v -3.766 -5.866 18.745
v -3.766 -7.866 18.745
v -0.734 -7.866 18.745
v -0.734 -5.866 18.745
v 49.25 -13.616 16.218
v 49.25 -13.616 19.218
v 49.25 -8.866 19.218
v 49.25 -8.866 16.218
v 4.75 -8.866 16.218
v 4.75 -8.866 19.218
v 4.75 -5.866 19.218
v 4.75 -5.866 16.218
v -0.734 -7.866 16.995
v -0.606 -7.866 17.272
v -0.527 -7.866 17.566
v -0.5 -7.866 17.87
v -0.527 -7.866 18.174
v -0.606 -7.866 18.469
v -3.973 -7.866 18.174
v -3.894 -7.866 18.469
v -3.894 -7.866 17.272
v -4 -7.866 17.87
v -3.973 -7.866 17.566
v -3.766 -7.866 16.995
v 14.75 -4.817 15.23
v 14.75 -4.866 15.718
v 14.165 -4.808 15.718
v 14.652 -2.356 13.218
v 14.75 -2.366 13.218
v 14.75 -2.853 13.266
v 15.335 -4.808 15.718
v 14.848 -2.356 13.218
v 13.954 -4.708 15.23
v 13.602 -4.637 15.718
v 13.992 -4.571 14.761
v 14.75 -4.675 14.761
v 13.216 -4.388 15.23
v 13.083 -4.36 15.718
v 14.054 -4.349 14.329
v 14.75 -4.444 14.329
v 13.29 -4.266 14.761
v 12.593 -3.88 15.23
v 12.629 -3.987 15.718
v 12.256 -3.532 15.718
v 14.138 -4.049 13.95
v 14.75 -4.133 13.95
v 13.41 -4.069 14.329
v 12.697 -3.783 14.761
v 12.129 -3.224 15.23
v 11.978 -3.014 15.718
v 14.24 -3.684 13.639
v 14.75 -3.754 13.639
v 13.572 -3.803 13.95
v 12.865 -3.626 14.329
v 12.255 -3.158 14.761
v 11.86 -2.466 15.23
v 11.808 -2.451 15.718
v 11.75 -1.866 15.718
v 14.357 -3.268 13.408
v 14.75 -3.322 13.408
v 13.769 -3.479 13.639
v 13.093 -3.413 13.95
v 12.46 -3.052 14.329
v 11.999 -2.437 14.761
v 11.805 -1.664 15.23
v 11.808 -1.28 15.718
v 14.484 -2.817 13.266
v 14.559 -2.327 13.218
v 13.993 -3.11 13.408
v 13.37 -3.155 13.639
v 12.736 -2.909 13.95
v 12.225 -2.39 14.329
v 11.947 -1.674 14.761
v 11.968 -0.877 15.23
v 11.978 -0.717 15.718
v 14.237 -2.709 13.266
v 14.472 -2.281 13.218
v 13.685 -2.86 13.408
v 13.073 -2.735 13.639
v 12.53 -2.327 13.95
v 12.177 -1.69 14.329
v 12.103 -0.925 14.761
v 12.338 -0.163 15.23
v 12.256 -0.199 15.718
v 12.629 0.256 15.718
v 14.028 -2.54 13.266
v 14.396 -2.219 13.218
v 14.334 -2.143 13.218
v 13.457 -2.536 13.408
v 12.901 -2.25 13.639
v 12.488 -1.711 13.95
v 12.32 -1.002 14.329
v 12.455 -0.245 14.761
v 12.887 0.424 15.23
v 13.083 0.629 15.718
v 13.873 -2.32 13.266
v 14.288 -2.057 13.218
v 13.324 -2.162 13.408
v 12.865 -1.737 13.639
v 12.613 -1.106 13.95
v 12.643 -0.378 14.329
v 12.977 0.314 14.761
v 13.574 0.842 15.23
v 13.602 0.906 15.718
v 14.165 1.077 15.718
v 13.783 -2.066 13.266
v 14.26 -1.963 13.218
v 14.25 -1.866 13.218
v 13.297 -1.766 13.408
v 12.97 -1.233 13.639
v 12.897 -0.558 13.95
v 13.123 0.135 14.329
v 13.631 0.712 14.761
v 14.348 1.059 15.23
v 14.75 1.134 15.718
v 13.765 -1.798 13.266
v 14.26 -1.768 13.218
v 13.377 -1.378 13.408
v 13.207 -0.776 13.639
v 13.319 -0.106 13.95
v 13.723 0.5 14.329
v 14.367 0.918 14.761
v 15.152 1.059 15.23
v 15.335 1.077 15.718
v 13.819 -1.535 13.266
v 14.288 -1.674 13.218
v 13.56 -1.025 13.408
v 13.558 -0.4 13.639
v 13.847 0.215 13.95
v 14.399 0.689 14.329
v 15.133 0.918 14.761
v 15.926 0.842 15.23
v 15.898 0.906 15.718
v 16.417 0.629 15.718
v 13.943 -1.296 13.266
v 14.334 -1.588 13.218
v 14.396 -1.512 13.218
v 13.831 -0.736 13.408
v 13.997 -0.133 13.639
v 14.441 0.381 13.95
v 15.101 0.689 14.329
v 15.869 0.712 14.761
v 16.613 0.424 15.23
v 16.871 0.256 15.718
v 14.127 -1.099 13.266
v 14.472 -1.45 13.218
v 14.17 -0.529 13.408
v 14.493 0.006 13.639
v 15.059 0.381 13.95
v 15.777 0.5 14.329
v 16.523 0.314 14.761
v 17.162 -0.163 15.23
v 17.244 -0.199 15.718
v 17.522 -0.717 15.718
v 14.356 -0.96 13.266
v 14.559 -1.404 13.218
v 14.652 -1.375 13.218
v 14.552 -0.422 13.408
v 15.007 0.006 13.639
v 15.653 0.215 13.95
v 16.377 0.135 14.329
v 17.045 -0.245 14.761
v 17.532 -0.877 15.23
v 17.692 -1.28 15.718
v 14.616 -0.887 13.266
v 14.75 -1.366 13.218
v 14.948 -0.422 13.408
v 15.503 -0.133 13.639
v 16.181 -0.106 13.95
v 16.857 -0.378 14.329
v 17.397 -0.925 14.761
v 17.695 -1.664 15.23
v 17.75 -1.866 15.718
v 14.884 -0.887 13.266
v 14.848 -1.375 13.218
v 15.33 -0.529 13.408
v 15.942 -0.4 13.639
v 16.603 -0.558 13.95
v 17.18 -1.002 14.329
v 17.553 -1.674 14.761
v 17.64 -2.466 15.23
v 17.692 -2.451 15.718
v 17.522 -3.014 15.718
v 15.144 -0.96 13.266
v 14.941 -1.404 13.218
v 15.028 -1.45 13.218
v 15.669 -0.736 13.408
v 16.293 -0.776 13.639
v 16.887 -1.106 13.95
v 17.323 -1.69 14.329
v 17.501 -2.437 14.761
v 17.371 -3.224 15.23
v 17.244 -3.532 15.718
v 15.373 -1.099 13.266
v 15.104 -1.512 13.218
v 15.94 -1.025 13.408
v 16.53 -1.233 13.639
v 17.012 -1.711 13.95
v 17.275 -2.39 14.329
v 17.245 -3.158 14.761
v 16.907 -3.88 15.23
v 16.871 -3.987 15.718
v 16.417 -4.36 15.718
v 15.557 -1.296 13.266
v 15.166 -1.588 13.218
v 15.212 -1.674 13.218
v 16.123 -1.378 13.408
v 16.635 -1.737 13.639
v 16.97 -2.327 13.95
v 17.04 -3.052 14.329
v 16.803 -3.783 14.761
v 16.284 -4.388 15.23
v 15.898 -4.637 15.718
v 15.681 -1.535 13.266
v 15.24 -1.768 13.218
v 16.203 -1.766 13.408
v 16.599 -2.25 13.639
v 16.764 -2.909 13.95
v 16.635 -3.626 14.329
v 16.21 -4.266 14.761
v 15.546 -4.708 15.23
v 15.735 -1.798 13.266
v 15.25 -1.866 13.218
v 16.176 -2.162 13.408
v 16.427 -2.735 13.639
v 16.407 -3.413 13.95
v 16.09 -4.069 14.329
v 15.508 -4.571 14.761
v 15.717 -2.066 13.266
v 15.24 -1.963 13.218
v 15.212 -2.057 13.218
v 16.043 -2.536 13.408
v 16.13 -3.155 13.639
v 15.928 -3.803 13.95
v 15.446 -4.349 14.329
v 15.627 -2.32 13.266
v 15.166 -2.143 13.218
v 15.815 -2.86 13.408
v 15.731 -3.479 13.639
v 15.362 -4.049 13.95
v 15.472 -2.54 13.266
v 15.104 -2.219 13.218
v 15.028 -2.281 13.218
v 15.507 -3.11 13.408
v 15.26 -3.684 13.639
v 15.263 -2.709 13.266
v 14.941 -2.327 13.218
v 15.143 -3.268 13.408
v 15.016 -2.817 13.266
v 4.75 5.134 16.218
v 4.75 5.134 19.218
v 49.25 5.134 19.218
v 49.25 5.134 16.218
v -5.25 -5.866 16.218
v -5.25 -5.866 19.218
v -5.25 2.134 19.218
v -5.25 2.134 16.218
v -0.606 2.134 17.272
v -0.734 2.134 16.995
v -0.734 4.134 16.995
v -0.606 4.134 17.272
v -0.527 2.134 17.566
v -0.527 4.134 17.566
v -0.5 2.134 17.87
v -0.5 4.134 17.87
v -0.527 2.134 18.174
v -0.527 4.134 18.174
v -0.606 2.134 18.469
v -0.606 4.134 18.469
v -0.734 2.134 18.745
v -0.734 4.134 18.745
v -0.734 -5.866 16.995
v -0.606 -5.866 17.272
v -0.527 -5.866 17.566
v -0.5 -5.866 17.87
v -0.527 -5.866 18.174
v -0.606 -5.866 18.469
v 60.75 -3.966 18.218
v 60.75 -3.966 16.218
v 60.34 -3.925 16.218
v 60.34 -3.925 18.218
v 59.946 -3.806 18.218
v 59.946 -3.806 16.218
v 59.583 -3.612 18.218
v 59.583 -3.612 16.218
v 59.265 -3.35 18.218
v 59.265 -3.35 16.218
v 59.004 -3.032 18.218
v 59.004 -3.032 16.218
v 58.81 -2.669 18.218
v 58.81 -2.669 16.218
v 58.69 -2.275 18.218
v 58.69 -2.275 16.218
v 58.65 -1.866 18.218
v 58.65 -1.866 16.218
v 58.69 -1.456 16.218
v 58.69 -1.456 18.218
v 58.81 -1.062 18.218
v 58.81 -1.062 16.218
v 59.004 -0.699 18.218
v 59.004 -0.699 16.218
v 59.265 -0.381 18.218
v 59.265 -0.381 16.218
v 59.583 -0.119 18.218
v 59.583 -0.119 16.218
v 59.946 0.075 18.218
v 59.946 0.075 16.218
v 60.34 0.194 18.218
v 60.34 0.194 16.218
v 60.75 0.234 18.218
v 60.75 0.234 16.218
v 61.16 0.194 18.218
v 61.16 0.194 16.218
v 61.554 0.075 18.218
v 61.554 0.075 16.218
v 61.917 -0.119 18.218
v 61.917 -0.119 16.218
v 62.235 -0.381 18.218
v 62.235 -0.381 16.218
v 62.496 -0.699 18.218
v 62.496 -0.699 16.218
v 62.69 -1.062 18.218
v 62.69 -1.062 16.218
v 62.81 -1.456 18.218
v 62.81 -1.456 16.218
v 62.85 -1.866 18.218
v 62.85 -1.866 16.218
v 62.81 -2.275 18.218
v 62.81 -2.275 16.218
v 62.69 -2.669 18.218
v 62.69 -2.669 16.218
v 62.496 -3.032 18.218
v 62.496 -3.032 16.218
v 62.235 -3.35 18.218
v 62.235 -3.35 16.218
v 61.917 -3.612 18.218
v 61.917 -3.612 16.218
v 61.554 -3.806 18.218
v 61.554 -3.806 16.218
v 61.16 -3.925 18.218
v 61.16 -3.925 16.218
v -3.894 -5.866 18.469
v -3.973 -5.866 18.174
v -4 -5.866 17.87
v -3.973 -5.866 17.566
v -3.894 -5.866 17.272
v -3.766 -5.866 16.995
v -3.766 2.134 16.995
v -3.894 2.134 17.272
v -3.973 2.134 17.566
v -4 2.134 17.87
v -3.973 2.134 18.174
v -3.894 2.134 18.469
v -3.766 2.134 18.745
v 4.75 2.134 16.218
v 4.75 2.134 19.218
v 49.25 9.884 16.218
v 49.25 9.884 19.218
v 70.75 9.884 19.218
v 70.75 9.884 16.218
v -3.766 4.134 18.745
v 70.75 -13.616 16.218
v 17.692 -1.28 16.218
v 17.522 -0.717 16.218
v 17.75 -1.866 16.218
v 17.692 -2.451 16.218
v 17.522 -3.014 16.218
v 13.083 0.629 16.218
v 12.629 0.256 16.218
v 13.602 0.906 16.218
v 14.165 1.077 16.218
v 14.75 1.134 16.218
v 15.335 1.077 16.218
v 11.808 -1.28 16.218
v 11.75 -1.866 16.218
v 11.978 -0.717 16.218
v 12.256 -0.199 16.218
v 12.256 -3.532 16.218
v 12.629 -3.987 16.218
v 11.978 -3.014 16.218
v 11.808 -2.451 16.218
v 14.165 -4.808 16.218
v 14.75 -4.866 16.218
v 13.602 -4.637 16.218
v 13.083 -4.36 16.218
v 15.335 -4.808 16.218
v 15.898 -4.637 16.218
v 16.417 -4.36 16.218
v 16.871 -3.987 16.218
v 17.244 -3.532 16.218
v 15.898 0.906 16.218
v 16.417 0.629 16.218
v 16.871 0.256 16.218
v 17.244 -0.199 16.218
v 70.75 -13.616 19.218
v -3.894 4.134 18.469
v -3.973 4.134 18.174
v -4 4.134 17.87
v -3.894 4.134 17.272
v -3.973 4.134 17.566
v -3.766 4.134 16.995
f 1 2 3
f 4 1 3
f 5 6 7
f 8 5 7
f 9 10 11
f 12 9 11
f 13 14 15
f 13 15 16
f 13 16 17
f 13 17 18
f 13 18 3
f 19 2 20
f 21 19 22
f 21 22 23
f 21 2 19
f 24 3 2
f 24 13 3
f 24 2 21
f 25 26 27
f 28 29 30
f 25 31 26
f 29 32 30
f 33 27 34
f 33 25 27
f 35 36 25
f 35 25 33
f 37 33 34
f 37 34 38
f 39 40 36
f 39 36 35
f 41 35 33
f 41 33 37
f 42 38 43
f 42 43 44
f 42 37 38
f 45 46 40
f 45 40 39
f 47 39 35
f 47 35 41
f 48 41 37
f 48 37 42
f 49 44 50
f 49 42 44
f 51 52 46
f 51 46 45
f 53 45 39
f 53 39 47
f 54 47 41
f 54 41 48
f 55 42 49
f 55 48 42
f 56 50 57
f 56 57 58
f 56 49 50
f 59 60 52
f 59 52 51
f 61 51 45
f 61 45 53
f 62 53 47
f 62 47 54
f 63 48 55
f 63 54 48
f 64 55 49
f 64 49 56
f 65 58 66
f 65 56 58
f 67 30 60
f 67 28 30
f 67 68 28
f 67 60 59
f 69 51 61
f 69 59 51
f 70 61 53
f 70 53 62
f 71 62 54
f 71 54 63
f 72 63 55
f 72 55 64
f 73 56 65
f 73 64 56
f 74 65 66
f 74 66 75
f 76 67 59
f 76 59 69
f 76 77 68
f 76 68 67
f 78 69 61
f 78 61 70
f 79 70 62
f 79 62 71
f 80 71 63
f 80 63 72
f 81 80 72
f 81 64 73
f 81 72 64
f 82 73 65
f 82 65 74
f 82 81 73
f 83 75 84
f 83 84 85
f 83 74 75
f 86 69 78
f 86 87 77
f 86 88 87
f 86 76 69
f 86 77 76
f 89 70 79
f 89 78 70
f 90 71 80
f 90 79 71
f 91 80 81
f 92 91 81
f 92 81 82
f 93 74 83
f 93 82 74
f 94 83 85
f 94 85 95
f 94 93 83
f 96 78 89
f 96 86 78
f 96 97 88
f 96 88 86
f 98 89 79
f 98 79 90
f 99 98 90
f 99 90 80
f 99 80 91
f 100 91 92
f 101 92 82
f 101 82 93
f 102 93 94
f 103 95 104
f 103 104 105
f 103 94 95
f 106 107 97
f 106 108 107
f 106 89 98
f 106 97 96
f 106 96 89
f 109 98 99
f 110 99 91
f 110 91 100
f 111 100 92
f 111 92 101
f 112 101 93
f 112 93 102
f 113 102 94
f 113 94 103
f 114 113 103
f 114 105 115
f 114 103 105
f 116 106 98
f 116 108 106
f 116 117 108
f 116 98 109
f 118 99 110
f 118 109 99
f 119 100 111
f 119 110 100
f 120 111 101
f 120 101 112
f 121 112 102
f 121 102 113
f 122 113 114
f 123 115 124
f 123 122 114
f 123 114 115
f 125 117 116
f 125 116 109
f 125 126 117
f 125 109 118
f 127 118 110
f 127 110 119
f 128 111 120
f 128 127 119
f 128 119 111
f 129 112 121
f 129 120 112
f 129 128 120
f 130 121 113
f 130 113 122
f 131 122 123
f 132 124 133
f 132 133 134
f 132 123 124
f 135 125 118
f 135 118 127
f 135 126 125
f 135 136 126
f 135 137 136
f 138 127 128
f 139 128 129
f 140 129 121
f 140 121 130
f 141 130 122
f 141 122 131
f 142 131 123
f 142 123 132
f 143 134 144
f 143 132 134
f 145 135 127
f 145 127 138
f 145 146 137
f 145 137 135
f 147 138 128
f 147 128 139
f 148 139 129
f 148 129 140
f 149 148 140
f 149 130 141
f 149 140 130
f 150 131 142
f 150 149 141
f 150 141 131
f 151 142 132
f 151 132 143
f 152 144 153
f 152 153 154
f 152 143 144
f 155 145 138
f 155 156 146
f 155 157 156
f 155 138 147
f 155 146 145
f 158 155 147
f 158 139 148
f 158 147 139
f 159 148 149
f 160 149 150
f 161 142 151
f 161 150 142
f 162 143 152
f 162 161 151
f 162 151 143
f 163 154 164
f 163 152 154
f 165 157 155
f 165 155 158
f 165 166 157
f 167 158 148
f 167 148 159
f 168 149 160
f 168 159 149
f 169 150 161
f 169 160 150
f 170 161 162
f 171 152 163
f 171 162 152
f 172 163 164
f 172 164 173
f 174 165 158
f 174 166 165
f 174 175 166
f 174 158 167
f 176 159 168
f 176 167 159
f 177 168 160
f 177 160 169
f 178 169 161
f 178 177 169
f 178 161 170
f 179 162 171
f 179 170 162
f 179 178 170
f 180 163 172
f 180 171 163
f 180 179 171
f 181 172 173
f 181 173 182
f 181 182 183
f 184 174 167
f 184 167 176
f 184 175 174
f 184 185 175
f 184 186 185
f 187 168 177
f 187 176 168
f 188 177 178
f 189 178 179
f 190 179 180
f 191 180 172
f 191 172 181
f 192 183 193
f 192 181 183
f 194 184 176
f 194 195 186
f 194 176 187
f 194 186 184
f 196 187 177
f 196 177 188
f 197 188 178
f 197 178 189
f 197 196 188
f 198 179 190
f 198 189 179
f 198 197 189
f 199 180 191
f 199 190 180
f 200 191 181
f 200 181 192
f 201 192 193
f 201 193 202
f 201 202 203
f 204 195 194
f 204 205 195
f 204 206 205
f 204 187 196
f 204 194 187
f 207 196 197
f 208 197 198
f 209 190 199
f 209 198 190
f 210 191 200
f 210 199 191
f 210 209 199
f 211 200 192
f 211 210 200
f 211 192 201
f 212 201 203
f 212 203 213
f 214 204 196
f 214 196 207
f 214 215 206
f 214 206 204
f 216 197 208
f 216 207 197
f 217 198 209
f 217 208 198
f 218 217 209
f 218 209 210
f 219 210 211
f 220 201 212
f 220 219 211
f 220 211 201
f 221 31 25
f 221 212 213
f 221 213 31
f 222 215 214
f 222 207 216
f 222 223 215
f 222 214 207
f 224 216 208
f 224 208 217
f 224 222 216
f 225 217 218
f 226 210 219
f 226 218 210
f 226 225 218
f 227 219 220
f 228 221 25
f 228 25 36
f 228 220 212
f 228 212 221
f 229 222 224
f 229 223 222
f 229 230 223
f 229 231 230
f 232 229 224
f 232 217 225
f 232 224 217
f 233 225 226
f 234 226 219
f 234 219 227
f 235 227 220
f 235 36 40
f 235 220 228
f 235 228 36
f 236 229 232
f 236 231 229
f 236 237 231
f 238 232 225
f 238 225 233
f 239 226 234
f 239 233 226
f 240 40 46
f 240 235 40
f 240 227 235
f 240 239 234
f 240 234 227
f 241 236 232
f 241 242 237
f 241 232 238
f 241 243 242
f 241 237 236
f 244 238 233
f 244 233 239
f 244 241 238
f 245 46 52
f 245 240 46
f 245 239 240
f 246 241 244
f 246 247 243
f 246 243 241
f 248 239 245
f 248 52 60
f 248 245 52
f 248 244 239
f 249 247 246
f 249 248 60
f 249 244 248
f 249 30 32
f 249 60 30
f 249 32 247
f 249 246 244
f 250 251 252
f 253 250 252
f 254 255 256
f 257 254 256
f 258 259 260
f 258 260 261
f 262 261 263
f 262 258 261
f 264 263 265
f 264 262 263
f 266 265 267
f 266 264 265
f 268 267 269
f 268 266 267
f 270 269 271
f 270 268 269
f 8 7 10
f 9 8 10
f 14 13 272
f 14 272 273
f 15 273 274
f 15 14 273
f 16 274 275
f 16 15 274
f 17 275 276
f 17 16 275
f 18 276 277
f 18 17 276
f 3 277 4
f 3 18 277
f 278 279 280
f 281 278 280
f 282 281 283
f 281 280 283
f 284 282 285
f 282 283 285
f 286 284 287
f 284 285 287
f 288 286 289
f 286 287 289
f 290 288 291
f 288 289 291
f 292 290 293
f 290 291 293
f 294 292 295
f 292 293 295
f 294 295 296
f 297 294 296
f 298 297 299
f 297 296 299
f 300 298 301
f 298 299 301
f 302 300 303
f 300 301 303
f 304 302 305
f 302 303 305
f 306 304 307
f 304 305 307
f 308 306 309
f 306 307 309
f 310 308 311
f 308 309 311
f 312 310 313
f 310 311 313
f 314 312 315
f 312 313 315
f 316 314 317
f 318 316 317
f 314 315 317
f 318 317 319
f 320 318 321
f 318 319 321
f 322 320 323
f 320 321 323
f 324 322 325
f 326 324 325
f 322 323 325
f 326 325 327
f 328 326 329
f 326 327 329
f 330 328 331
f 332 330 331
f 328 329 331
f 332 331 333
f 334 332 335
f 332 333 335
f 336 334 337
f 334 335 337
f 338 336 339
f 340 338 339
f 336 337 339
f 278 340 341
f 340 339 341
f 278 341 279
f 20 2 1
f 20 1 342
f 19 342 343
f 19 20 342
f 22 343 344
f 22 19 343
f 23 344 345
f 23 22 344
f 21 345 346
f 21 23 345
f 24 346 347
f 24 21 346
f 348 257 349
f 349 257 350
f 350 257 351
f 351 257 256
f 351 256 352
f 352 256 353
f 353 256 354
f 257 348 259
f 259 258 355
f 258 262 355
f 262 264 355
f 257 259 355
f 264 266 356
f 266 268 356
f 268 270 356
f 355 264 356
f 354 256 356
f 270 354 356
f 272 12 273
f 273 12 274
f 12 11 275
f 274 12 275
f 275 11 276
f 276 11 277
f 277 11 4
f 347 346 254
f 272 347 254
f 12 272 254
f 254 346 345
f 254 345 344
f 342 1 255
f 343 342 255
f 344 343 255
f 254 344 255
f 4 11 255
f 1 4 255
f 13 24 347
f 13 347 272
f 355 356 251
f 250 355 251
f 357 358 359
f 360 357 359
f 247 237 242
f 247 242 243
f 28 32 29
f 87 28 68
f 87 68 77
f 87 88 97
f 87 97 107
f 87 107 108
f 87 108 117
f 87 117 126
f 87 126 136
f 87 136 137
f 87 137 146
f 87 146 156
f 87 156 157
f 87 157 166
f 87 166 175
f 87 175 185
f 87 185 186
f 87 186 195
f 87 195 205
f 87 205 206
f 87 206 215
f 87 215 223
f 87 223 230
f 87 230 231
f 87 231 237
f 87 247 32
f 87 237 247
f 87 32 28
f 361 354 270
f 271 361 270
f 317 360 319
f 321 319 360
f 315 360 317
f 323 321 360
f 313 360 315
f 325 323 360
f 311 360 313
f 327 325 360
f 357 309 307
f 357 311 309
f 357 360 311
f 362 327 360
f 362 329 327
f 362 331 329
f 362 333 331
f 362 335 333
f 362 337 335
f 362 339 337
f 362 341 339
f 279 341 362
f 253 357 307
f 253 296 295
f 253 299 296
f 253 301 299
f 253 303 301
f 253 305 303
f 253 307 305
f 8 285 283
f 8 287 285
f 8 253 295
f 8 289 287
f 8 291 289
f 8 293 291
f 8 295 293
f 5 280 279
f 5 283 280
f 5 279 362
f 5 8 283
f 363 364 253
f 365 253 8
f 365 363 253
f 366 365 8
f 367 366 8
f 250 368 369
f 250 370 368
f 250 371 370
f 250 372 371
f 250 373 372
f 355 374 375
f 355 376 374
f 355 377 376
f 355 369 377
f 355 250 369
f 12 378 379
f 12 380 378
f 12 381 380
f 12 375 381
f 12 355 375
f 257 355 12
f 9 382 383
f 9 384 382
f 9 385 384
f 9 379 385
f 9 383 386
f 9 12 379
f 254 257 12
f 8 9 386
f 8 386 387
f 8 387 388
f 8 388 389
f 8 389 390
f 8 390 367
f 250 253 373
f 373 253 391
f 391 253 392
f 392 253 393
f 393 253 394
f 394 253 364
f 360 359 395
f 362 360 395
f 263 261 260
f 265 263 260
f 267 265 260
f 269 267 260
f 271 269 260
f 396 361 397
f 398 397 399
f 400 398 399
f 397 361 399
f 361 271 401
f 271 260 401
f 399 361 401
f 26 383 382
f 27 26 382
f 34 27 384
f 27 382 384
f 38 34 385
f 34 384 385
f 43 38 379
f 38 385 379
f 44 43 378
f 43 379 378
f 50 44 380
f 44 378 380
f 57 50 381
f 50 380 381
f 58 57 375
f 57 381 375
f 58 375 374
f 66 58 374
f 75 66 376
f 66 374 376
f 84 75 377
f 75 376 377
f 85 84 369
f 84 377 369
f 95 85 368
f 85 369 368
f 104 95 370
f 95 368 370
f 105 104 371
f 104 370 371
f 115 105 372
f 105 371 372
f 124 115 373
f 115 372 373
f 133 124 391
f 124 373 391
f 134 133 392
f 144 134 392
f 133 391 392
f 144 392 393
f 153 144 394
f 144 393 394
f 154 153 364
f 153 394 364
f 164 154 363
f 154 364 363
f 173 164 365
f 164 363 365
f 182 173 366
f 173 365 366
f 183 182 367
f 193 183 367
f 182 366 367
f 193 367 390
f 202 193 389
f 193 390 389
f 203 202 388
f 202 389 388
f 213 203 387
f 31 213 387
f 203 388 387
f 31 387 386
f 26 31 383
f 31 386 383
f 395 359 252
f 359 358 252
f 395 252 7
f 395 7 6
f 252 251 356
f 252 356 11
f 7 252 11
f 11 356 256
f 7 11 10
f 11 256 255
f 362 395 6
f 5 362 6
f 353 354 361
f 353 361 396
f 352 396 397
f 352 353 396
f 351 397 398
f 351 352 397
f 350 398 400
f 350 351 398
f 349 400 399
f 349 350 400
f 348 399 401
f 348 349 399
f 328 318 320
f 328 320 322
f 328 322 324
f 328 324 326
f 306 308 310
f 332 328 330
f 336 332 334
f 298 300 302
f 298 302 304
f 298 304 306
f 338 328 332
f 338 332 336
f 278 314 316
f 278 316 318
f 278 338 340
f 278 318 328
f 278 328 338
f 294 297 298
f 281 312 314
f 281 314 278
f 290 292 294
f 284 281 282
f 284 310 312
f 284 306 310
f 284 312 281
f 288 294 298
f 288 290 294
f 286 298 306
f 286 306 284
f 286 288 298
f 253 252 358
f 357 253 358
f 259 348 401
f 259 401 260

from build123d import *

# Parameters (mm, degrees)
PAD005_DEPTH            = 3
PAD006_DEPTH            = 6
SKETCH006_R             = 2.1
POCKET_DEPTH            = 2
SKETCH007_R             = 3
PAD007_DEPTH            = 3
FILLET001_R             = 2.5
BODY001_ROLL_ANGLE      = 180
BODY001_PLACEMENT_ANGLE = -90


with BuildPart() as part:
    # Sketch005 → Pad005 (new body)
    with BuildSketch(Plane.XY):
        Polygon((-11.75, -33), (11.75, -33), (11.75, -11.5), (7, -11.5), (7, 33), (4, 33), (4, 43), (-4, 43), (-4, 33), (-7, 33), (-7, -11.5), (-11.75, -11.5), align=None)
    extrude(amount=PAD005_DEPTH)

    # Sketch001 → Pad006 (join, symmetric)
    with BuildSketch(Plane.YZ):
        with BuildLine():
            ThreePointArc((41.515544, 0.472742), (41.75, 1.347742), (41.515544, 2.222742))
            Line((41.515544, 2.222742), (38.484456, 2.222742))
            ThreePointArc((38.484456, 2.222742), (38.25, 1.347742), (38.484456, 0.472742))
            Line((41.515544, 0.472742), (38.484456, 0.472742))
        make_face()
    extrude(amount=PAD006_DEPTH, both=True)

    # Sketch006 (on Face5 of Pad006) → Pocket (cut)
    with BuildSketch(Plane.XY.offset(3)):
        with Locations((0, -23)):
            Circle(SKETCH006_R)
    extrude(amount=-POCKET_DEPTH, mode=Mode.SUBTRACT)

    # Sketch007 (on Face5 of Pocket) → Pad007 (join)
    with BuildSketch(Plane.XY.offset(3)):
        with Locations((0, 23)):
            Circle(SKETCH007_R)
    extrude(amount=PAD007_DEPTH)

    # Fillet001
    fillet001_edges = [part.edges().sort_by_distance(p)[0] for p in [
        (-3, 23, 6),
    ]]
    fillet(fillet001_edges, radius=FILLET001_R)


with BuildPart() as part_1:
    # Body001 roll: moved
    add(part.part.rotate(Axis((0, 0, 0), (1, 0, 0)), BODY001_ROLL_ANGLE))


with BuildPart() as part_2:
    # Body001 placement: moved
    add(part_1.part.moved(Location((37.75, -1.865516, 19.218022))).rotate(Axis((37.75, -1.865516, 19.218022), (0, 0, 1)), BODY001_PLACEMENT_ANGLE))


solid = part_2.part
